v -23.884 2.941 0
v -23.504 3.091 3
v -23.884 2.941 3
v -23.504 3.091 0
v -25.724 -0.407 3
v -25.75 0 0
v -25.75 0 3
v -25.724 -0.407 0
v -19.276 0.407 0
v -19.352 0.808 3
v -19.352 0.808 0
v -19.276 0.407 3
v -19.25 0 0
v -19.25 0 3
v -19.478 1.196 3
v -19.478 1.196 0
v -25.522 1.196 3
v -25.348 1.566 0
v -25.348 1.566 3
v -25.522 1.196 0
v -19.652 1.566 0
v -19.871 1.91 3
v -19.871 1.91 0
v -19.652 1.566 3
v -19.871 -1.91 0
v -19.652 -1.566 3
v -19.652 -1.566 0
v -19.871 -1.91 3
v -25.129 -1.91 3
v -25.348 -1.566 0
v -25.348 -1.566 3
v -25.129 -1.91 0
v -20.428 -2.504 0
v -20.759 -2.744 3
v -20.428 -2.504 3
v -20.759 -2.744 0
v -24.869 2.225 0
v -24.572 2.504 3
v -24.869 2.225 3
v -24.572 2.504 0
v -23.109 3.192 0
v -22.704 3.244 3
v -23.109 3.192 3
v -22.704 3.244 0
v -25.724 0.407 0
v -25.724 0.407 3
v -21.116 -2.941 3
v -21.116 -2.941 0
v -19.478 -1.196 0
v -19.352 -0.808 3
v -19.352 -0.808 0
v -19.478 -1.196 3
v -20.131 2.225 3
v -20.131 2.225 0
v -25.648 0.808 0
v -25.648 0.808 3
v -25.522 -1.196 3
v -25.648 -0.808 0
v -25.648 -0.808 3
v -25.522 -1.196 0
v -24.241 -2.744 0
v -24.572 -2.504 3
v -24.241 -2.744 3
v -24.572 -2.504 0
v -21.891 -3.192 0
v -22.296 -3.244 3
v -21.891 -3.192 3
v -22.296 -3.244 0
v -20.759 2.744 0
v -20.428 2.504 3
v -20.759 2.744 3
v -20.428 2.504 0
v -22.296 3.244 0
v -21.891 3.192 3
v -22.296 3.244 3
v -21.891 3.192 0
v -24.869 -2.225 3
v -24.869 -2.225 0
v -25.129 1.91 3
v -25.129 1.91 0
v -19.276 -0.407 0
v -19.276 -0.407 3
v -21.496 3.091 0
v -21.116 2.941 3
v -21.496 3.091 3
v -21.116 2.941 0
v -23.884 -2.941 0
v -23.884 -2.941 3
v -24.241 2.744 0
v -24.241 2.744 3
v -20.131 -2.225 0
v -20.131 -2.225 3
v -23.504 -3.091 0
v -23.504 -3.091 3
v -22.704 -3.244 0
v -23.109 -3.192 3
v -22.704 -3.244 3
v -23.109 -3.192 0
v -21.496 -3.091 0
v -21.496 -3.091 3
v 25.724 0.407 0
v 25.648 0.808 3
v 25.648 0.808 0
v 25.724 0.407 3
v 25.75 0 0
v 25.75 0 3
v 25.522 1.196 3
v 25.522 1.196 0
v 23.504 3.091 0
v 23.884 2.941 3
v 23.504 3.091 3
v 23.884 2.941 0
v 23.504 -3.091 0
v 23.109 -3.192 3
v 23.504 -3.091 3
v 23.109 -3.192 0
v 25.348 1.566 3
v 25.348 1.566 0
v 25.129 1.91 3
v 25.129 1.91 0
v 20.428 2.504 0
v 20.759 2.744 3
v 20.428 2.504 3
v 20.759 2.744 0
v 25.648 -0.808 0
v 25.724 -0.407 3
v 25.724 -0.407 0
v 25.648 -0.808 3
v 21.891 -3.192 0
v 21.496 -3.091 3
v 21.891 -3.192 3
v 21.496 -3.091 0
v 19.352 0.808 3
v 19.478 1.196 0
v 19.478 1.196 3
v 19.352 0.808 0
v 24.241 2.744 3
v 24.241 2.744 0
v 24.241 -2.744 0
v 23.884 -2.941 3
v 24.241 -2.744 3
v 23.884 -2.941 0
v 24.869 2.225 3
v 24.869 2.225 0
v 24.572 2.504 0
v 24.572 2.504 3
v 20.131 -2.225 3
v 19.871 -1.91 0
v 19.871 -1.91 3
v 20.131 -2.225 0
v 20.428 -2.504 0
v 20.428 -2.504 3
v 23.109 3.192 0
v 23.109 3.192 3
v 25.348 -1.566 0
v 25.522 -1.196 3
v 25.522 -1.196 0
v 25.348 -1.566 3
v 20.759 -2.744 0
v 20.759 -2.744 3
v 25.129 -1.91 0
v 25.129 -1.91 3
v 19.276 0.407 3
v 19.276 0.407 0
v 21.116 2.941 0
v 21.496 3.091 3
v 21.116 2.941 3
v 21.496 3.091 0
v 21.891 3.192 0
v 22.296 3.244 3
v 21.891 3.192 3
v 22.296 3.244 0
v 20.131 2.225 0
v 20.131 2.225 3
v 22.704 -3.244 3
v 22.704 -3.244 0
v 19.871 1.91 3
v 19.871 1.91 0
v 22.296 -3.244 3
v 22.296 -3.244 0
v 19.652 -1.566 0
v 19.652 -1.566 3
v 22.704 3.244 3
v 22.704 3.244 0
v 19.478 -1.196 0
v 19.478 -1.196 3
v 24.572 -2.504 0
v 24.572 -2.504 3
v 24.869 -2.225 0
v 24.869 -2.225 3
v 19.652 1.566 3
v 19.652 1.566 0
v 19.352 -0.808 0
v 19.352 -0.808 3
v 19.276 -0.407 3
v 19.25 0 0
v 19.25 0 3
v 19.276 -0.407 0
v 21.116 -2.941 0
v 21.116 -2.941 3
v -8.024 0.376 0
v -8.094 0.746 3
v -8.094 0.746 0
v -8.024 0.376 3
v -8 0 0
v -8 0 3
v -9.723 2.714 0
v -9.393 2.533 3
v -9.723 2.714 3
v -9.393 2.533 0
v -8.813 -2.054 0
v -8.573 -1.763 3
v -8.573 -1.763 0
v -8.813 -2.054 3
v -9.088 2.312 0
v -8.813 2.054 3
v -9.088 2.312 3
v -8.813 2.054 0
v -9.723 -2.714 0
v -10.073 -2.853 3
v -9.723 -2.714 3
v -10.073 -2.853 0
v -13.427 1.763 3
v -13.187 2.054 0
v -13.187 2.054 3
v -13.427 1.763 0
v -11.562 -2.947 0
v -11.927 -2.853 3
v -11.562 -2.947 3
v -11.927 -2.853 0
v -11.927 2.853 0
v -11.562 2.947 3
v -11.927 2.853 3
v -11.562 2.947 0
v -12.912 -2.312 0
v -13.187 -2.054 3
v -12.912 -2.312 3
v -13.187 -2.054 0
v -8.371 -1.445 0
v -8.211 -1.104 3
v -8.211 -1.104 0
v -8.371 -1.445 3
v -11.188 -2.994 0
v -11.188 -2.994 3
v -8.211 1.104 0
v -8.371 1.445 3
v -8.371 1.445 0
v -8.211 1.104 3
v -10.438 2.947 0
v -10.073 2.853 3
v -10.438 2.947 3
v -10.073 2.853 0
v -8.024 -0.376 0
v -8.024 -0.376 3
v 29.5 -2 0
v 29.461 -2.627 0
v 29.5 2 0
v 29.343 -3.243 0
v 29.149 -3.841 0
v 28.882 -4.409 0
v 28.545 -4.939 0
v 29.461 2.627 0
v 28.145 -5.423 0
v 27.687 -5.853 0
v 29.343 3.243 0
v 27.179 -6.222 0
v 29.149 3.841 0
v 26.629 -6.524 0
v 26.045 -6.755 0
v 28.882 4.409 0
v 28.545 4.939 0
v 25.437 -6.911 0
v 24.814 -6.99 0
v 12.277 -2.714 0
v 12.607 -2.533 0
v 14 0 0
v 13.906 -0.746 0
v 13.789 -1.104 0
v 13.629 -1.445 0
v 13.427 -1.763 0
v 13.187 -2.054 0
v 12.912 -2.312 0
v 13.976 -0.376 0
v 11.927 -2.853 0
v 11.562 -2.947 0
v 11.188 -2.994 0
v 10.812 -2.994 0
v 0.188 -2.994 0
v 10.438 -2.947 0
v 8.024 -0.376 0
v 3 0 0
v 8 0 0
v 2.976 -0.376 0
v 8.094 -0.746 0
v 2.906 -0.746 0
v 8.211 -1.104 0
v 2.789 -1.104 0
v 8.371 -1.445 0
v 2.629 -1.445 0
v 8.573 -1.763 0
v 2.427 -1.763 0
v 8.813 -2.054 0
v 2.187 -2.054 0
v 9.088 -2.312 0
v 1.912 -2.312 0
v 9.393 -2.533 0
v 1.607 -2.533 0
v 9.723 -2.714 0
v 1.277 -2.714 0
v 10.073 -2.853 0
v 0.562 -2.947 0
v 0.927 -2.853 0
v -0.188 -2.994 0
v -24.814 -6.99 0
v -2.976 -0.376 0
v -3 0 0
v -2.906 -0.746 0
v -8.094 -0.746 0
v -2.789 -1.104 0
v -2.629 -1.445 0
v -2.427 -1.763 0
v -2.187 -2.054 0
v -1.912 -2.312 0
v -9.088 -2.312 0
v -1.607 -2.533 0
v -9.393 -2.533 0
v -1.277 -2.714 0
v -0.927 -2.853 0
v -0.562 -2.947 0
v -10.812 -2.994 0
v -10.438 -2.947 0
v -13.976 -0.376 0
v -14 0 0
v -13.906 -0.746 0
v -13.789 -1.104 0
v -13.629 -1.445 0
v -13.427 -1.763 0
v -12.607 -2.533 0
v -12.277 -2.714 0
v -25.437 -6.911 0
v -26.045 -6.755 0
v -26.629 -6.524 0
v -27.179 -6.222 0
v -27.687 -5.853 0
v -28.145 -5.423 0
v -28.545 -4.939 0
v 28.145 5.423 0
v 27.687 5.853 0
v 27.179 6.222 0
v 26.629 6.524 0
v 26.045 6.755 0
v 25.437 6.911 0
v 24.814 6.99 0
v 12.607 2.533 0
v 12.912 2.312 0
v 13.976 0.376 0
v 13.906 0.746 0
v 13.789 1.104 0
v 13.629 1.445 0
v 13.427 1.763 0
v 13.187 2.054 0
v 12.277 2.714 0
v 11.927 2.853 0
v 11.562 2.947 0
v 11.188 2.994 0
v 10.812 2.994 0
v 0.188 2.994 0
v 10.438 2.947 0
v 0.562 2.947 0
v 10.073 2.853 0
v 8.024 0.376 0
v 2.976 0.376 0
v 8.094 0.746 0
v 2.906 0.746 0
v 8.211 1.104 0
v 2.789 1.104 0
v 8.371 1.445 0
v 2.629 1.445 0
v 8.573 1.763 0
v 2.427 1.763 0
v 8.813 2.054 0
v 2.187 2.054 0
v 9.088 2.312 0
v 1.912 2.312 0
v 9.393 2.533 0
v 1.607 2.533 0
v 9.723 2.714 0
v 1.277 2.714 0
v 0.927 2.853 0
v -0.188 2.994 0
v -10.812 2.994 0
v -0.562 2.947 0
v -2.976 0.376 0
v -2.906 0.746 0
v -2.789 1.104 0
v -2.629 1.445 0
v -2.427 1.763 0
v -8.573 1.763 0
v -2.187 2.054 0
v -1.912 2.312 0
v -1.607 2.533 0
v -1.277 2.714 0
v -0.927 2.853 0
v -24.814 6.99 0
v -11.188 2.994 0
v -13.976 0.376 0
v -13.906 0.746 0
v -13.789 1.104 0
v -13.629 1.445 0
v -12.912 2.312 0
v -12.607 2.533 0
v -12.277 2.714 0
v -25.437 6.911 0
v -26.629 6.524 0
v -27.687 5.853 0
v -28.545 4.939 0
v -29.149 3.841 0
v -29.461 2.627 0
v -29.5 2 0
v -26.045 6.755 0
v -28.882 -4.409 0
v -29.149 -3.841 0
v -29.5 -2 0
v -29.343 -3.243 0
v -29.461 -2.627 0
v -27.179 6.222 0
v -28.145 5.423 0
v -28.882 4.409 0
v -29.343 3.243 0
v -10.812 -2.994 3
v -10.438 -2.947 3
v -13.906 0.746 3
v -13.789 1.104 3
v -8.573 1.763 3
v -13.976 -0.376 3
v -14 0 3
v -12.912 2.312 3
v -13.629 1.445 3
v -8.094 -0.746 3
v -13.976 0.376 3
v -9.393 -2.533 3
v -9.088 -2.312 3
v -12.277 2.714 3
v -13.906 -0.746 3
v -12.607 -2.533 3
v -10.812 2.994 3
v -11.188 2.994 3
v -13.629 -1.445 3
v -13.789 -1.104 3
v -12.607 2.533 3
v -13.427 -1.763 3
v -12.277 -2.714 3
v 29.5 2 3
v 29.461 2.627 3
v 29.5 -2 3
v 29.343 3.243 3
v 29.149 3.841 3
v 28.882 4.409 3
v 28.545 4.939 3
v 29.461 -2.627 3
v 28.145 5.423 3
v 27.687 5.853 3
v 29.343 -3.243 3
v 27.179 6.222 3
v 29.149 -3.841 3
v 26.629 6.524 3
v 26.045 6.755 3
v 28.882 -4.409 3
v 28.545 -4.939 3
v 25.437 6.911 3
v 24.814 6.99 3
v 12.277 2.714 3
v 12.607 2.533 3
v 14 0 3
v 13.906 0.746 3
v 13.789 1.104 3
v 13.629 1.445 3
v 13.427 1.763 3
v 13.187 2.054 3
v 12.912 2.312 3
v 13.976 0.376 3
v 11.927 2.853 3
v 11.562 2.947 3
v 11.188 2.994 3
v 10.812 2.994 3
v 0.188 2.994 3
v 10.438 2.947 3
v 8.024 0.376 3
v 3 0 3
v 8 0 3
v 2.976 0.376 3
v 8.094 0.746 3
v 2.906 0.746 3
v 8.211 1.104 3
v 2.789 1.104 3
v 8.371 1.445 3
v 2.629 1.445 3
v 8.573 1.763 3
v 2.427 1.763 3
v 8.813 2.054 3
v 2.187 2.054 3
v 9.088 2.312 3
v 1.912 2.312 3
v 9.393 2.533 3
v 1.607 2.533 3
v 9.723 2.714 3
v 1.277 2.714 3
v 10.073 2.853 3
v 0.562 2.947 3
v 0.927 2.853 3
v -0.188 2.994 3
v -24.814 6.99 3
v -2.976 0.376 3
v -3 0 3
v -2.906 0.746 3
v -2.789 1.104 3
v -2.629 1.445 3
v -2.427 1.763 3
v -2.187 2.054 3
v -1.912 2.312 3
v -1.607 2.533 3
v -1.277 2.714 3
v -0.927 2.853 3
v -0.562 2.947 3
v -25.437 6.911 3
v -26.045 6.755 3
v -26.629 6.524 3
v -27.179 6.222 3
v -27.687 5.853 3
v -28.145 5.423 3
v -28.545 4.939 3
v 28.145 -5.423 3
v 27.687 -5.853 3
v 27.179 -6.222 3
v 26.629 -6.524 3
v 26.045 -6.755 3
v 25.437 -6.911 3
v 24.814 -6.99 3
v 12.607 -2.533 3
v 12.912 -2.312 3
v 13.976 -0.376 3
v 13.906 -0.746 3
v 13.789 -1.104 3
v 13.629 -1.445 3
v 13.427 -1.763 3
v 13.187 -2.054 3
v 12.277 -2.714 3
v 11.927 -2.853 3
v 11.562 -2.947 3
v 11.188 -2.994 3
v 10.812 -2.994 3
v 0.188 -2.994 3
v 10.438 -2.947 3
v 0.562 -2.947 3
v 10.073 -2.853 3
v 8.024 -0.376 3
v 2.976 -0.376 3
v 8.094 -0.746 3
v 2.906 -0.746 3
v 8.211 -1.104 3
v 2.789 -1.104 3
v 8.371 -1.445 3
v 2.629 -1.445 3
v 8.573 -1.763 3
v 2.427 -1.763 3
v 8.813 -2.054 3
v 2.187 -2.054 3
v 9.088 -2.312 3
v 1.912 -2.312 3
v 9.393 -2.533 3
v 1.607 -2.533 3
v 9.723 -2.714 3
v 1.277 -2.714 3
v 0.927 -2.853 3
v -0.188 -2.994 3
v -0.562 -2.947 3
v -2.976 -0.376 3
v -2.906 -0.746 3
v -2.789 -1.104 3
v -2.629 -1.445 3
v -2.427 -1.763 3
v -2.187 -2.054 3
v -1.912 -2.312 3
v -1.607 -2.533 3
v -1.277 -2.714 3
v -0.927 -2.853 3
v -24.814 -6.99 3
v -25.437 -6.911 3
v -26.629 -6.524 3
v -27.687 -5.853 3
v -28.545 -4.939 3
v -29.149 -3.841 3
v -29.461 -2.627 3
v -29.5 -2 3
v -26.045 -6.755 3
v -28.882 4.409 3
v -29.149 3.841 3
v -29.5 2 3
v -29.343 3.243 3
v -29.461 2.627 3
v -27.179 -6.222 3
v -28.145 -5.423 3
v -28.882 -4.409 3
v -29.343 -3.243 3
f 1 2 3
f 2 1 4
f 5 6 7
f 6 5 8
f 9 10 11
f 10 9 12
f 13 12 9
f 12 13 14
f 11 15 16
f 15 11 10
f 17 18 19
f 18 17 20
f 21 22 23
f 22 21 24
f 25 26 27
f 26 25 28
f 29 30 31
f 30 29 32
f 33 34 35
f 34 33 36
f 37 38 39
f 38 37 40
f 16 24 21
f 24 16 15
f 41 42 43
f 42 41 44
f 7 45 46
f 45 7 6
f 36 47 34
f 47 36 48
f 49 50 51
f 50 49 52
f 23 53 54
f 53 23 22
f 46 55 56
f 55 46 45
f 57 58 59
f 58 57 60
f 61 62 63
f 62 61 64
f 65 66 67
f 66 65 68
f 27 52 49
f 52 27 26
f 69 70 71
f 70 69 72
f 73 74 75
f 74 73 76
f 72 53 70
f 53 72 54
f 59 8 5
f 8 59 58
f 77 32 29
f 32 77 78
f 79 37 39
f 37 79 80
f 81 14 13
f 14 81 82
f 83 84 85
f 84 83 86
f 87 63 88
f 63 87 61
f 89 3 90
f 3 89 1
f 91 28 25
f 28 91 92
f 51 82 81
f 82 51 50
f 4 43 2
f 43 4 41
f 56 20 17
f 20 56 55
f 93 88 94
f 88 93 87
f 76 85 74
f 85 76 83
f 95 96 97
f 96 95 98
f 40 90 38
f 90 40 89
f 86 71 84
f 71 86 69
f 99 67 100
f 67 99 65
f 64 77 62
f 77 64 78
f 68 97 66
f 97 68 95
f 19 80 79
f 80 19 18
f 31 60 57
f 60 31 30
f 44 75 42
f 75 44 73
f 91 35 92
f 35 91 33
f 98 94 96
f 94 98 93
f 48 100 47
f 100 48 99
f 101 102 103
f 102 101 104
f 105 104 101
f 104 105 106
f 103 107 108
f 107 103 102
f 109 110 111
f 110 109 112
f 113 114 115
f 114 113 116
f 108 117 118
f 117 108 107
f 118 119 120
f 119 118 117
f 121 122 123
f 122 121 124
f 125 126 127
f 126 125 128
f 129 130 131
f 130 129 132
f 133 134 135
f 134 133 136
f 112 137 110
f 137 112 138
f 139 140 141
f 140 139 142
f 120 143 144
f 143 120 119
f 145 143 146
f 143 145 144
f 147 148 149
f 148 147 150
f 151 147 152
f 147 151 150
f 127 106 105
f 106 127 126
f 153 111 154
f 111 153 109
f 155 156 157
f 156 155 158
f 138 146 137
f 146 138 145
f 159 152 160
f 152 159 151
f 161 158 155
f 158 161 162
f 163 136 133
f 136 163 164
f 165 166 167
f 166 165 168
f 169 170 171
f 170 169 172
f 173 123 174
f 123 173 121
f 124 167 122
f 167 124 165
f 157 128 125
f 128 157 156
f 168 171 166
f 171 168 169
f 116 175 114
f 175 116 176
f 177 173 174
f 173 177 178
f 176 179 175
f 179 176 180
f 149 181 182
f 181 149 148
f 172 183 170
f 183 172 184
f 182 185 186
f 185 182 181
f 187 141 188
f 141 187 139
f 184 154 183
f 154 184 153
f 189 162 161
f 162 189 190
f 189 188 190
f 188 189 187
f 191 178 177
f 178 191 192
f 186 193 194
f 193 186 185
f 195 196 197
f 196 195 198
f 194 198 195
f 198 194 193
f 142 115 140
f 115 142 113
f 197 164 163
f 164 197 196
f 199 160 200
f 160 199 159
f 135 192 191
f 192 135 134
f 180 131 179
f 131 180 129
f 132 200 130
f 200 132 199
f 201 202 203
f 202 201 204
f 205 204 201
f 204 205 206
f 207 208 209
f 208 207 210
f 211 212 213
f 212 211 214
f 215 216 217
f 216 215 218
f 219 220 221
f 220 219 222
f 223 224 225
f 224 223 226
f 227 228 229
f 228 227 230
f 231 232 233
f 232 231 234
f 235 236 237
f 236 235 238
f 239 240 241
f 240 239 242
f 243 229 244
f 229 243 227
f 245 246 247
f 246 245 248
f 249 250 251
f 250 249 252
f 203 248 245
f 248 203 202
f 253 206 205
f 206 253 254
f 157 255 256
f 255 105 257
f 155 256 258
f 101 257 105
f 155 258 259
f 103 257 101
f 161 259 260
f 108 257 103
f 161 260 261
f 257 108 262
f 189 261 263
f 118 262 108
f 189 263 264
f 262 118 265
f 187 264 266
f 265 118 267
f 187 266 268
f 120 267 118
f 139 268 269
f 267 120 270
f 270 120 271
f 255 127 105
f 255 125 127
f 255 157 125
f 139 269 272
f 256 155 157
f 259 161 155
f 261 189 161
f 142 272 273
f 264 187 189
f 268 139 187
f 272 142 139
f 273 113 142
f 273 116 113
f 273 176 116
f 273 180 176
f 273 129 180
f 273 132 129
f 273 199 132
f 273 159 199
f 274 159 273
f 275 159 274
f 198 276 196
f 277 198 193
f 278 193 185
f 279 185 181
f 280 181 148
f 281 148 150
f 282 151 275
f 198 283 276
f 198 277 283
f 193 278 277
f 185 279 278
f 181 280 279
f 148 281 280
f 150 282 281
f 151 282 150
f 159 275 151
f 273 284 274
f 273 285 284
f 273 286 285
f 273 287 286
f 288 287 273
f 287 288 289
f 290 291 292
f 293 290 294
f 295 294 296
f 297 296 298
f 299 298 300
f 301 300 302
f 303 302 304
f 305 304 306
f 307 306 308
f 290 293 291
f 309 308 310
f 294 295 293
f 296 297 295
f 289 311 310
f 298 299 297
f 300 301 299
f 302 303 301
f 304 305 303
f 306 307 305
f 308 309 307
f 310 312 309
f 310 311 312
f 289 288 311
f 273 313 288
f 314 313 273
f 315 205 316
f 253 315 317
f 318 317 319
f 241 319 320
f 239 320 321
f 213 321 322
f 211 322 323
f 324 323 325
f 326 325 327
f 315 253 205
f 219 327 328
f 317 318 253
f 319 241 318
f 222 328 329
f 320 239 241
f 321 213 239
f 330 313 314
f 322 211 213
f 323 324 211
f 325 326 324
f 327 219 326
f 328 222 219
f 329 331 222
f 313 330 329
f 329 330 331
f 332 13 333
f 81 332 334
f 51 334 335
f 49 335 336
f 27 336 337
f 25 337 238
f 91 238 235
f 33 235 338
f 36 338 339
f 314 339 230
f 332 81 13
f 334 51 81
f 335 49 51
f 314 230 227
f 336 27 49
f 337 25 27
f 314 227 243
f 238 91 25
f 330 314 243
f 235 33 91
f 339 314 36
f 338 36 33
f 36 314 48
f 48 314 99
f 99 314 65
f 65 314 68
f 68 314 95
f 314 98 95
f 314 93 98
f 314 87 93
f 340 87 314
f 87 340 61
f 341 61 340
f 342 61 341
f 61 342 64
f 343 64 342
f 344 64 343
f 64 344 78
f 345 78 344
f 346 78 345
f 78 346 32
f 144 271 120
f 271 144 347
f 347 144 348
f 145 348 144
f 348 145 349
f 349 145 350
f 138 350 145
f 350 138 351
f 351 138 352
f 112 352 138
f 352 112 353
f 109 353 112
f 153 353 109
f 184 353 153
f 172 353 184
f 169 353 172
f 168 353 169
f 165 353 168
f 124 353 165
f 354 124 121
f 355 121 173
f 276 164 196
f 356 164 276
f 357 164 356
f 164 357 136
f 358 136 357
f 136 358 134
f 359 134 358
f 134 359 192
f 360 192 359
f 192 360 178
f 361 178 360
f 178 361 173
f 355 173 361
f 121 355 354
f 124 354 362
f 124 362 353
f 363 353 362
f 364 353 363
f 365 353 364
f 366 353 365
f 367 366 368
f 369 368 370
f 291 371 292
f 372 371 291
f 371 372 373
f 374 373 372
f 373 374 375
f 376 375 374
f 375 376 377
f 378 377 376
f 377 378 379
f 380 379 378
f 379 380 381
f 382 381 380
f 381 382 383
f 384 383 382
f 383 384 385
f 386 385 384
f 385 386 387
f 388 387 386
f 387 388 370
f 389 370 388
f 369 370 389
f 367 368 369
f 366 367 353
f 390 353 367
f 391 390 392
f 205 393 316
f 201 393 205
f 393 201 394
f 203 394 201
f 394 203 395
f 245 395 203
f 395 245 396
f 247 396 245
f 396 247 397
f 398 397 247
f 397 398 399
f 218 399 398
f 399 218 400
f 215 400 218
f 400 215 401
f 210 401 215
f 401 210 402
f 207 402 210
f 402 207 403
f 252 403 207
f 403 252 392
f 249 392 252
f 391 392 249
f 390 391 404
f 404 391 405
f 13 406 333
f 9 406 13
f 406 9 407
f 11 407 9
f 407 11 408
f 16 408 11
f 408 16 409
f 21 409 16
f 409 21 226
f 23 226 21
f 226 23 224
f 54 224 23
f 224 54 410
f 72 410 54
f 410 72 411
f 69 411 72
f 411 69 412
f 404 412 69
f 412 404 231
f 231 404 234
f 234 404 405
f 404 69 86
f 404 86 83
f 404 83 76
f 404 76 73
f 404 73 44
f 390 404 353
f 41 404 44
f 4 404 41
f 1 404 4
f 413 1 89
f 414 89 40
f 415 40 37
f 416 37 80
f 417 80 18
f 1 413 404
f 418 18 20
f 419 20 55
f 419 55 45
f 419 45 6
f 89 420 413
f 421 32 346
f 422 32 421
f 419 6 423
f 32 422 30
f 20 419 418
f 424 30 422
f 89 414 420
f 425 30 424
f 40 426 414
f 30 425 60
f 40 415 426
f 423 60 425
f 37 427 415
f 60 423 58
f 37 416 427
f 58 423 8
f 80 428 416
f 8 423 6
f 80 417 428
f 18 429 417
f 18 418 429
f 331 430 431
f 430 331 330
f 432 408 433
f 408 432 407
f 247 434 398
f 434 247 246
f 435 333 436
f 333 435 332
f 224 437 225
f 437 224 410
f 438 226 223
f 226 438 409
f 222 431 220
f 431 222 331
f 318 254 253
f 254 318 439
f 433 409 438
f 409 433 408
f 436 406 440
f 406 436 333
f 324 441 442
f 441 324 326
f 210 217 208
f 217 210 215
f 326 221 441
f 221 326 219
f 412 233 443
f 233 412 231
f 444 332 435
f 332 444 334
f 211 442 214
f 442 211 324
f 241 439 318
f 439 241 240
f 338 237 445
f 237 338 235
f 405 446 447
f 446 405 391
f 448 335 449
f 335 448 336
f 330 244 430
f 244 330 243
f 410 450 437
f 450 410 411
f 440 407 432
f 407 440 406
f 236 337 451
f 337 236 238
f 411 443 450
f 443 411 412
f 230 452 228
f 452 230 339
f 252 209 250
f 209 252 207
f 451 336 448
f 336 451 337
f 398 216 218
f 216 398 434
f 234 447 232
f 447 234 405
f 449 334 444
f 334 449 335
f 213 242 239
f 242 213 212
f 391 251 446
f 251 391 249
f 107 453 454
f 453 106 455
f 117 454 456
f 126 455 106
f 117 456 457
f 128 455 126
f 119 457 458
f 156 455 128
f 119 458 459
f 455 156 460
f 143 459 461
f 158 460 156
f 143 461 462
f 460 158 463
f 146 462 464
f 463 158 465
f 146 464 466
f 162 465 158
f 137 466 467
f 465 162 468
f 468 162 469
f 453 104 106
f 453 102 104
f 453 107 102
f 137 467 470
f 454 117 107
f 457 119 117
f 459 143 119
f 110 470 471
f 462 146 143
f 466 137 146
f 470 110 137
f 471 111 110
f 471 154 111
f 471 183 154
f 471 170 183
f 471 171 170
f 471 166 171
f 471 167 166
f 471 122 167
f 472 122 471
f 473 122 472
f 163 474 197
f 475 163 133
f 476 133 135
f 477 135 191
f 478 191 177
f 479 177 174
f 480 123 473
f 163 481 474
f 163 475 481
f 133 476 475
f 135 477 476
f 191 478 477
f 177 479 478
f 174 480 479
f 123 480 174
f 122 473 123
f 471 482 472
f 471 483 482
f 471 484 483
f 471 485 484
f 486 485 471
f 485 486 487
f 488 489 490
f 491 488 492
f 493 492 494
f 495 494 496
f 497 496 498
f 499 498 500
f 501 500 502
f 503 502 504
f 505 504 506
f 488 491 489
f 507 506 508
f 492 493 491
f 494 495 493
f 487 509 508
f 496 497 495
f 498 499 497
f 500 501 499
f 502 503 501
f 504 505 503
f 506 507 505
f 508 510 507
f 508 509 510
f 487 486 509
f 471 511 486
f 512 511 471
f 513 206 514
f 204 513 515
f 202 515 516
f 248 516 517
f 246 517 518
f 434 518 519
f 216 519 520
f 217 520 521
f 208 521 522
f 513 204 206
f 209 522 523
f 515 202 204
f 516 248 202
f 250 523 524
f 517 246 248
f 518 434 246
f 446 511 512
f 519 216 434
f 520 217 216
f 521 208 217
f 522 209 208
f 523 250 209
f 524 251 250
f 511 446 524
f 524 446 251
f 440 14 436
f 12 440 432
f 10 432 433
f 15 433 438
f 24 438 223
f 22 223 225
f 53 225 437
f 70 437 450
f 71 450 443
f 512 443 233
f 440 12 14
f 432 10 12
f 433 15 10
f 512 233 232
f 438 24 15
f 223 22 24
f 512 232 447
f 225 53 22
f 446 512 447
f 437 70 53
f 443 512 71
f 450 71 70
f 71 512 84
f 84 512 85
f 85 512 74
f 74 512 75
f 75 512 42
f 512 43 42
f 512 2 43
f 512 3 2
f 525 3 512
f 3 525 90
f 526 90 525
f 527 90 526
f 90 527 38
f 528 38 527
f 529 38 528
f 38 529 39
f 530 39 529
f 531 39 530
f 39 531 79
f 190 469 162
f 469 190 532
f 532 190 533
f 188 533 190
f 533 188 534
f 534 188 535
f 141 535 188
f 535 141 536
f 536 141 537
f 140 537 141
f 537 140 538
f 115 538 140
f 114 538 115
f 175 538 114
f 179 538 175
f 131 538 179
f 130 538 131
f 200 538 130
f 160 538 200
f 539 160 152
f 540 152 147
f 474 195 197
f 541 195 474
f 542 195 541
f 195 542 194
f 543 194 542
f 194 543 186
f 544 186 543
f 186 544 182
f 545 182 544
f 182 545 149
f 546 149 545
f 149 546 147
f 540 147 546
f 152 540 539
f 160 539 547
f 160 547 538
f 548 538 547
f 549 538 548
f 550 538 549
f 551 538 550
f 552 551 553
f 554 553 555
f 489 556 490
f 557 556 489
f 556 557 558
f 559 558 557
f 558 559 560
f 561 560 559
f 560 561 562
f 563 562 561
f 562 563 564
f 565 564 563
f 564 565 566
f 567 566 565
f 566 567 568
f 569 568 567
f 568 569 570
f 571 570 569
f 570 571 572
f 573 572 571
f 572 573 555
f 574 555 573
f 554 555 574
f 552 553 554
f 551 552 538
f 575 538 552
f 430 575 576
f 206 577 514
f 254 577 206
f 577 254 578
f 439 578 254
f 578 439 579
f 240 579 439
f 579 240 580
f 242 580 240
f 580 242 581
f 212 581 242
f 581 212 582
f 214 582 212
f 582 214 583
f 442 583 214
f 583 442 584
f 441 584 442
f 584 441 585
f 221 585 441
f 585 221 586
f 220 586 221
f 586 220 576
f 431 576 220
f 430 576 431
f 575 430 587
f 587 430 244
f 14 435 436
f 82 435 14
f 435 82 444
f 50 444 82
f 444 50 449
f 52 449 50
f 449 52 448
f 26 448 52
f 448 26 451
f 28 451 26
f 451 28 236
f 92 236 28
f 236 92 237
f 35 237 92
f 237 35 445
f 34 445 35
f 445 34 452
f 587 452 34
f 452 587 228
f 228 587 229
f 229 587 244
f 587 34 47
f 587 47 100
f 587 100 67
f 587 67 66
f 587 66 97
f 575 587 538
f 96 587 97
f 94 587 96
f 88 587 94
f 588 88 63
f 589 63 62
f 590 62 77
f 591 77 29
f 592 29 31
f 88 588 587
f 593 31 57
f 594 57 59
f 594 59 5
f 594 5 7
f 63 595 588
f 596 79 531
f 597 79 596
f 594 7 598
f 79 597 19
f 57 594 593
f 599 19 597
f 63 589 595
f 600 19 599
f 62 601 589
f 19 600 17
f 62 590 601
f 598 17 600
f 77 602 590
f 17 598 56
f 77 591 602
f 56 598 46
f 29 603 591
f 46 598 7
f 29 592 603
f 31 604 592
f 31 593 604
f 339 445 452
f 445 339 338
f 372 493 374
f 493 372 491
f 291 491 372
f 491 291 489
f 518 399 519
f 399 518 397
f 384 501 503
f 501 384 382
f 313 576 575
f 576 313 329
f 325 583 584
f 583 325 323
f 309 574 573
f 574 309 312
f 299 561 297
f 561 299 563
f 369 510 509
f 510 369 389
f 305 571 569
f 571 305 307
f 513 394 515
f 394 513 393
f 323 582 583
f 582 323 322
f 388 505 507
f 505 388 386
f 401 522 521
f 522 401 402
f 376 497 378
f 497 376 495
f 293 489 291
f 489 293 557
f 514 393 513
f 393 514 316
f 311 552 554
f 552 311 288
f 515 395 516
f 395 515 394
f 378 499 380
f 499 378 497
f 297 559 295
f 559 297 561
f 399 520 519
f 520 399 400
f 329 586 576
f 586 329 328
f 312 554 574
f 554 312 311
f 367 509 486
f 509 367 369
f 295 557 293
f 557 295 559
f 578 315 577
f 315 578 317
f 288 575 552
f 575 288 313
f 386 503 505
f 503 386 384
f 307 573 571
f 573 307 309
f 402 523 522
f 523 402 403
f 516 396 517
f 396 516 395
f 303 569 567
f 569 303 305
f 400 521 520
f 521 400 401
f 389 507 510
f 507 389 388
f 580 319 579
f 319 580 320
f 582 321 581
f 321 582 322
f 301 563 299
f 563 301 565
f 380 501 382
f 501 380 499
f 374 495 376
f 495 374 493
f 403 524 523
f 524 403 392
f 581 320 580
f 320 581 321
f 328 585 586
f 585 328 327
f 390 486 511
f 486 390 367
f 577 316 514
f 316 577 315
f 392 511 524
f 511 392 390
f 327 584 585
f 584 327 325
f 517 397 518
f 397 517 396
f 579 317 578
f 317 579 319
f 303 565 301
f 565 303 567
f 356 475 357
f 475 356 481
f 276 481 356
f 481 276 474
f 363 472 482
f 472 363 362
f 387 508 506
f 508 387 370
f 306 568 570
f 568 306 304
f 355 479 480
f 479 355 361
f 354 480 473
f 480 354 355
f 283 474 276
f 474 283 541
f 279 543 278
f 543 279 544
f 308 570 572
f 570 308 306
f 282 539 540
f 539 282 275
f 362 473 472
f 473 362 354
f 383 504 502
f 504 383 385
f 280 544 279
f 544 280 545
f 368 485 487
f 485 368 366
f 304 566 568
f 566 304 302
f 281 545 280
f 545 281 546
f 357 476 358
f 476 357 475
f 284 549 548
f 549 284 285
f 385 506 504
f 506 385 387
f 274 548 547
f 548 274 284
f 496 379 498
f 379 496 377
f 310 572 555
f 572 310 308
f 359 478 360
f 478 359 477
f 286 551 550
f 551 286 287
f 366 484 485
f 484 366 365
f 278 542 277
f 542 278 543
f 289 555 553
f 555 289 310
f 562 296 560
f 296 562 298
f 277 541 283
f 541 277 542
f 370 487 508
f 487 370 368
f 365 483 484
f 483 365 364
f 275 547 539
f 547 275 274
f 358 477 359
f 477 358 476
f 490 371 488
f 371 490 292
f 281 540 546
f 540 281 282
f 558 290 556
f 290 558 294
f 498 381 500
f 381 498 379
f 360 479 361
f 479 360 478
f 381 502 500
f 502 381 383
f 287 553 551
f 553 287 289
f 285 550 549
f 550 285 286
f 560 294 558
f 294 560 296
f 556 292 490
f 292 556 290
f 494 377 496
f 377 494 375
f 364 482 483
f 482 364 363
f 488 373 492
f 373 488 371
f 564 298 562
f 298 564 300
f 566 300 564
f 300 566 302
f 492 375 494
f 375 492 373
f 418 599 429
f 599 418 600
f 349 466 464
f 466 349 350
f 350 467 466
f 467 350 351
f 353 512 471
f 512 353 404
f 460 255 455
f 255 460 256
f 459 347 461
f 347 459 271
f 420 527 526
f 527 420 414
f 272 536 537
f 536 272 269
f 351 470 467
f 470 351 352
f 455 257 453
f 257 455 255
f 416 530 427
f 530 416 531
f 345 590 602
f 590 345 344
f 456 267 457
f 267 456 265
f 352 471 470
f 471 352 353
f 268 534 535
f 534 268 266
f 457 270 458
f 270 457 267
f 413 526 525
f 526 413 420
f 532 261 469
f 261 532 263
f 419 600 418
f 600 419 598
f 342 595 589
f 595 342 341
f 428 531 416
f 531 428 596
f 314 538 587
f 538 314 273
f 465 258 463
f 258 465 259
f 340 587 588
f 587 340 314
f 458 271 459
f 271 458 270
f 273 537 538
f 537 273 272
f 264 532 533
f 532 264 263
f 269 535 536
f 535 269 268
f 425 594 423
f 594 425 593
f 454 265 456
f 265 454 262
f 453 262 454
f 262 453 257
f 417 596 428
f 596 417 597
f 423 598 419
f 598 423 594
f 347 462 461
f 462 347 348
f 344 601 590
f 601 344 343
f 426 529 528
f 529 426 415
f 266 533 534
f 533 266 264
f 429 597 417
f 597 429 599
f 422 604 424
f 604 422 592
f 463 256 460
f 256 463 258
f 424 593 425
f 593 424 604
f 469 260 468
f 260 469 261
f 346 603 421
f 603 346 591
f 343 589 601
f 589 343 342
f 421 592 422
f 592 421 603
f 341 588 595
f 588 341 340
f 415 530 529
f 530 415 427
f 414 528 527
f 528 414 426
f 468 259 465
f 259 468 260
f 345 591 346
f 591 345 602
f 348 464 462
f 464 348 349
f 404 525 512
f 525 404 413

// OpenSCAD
$fn = 50;


difference() {
	union() {
		hull() {
			translate(v = [-24.5000000000, 2.0000000000, 0]) {
				cylinder(h = 3, r = 5);
			}
			translate(v = [24.5000000000, 2.0000000000, 0]) {
				cylinder(h = 3, r = 5);
			}
			translate(v = [-24.5000000000, -2.0000000000, 0]) {
				cylinder(h = 3, r = 5);
			}
			translate(v = [24.5000000000, -2.0000000000, 0]) {
				cylinder(h = 3, r = 5);
			}
		}
	}
	union() {
		#translate(v = [-22.5000000000, 0.0000000000, 0]) {
			cylinder(h = 3, r = 3.2500000000);
		}
		#translate(v = [22.5000000000, 0.0000000000, 0]) {
			cylinder(h = 3, r = 3.2500000000);
		}
		#translate(v = [-22.5000000000, 0.0000000000, -100.0000000000]) {
			cylinder(h = 200, r = 3.2500000000);
		}
		#translate(v = [-22.5000000000, 0.0000000000, -100.0000000000]) {
			cylinder(h = 200, r = 3.2500000000);
		}
		#translate(v = [22.5000000000, 0.0000000000, -100.0000000000]) {
			cylinder(h = 200, r = 3.2500000000);
		}
		#translate(v = [22.5000000000, 0.0000000000, -100.0000000000]) {
			cylinder(h = 200, r = 3.2500000000);
		}
		#translate(v = [-22.5000000000, 0.0000000000, 0]) {
			cylinder(h = 3, r = 1.8000000000);
		}
		#translate(v = [22.5000000000, 0.0000000000, 0]) {
			cylinder(h = 3, r = 1.8000000000);
		}
		#translate(v = [-22.5000000000, 0.0000000000, 0]) {
			cylinder(h = 3, r = 1.8000000000);
		}
		#translate(v = [22.5000000000, 0.0000000000, 0]) {
			cylinder(h = 3, r = 1.8000000000);
		}
		#translate(v = [-22.5000000000, 0.0000000000, 0]) {
			cylinder(h = 3, r = 1.8000000000);
		}
		#translate(v = [22.5000000000, 0.0000000000, 0]) {
			cylinder(h = 3, r = 1.8000000000);
		}
		#translate(v = [-11.0000000000, 0, 0]) {
			cylinder(h = 3, r = 3.0000000000);
		}
		#cylinder(h = 3, r = 3.0000000000);
		#translate(v = [11.0000000000, 0, 0]) {
			cylinder(h = 3, r = 3.0000000000);
		}
	}
}
